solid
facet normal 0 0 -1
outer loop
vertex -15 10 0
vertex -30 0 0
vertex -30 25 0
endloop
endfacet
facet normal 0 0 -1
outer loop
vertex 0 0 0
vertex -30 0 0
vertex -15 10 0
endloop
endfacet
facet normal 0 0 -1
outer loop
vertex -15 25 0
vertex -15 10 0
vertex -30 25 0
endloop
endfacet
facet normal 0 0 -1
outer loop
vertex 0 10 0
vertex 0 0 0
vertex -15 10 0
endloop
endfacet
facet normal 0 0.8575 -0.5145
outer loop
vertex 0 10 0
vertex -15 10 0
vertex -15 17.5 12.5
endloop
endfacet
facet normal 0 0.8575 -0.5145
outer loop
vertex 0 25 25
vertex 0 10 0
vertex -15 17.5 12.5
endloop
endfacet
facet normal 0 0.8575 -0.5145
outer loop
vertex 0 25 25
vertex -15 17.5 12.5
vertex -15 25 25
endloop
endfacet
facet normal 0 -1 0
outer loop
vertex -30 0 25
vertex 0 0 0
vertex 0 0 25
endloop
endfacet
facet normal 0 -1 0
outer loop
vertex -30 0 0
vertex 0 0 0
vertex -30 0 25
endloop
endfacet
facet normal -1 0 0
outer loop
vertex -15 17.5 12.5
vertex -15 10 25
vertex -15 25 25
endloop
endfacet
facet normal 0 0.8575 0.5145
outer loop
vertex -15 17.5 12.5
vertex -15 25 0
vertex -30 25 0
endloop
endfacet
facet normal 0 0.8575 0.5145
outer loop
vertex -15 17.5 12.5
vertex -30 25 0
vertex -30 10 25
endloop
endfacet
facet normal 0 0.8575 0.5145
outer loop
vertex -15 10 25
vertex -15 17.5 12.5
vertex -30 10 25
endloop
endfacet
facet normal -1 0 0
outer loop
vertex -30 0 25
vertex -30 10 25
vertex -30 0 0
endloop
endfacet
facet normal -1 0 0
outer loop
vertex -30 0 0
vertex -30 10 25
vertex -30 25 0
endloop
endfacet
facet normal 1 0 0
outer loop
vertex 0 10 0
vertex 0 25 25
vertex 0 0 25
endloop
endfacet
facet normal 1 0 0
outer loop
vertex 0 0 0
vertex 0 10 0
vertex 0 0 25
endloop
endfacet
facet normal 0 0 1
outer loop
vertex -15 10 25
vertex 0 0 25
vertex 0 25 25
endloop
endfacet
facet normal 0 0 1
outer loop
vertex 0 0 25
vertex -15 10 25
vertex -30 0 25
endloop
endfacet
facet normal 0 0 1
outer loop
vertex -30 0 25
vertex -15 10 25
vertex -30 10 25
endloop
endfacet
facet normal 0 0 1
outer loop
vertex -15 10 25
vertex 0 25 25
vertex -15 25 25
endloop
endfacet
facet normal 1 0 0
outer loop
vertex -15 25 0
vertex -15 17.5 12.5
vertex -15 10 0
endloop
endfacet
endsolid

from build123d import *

# Parameters (mm, degrees)
BOSS_EXTRUDE1_DEPTH = 25
CUT_EXTRUDE1_DEPTH  = 25
BOSS_EXTRUDE2_DEPTH = 15


with BuildPart() as part:
    # Sketch1 → Boss-Extrude1 (new body)
    with BuildSketch(Plane.XY):
        Polygon((-30, 10), (-15, 10), (-15, 25), (0, 25), (0, 0), (-30, 0), align=None)
    extrude(amount=BOSS_EXTRUDE1_DEPTH)

    # Sketch2 → Cut-Extrude1 (cut)
    with BuildSketch(Plane.ZY.offset(15)):
        Polygon((0, 10), (25, 25), (0, 25), align=None)
    extrude(amount=-CUT_EXTRUDE1_DEPTH, mode=Mode.SUBTRACT)

    # Sketch4 → Boss-Extrude2 (add)
    with BuildSketch(Plane.ZY.offset(15)):
        Polygon((25, 10), (0, 10), (0, 25), align=None)
    extrude(amount=BOSS_EXTRUDE2_DEPTH)


solid = part.part
